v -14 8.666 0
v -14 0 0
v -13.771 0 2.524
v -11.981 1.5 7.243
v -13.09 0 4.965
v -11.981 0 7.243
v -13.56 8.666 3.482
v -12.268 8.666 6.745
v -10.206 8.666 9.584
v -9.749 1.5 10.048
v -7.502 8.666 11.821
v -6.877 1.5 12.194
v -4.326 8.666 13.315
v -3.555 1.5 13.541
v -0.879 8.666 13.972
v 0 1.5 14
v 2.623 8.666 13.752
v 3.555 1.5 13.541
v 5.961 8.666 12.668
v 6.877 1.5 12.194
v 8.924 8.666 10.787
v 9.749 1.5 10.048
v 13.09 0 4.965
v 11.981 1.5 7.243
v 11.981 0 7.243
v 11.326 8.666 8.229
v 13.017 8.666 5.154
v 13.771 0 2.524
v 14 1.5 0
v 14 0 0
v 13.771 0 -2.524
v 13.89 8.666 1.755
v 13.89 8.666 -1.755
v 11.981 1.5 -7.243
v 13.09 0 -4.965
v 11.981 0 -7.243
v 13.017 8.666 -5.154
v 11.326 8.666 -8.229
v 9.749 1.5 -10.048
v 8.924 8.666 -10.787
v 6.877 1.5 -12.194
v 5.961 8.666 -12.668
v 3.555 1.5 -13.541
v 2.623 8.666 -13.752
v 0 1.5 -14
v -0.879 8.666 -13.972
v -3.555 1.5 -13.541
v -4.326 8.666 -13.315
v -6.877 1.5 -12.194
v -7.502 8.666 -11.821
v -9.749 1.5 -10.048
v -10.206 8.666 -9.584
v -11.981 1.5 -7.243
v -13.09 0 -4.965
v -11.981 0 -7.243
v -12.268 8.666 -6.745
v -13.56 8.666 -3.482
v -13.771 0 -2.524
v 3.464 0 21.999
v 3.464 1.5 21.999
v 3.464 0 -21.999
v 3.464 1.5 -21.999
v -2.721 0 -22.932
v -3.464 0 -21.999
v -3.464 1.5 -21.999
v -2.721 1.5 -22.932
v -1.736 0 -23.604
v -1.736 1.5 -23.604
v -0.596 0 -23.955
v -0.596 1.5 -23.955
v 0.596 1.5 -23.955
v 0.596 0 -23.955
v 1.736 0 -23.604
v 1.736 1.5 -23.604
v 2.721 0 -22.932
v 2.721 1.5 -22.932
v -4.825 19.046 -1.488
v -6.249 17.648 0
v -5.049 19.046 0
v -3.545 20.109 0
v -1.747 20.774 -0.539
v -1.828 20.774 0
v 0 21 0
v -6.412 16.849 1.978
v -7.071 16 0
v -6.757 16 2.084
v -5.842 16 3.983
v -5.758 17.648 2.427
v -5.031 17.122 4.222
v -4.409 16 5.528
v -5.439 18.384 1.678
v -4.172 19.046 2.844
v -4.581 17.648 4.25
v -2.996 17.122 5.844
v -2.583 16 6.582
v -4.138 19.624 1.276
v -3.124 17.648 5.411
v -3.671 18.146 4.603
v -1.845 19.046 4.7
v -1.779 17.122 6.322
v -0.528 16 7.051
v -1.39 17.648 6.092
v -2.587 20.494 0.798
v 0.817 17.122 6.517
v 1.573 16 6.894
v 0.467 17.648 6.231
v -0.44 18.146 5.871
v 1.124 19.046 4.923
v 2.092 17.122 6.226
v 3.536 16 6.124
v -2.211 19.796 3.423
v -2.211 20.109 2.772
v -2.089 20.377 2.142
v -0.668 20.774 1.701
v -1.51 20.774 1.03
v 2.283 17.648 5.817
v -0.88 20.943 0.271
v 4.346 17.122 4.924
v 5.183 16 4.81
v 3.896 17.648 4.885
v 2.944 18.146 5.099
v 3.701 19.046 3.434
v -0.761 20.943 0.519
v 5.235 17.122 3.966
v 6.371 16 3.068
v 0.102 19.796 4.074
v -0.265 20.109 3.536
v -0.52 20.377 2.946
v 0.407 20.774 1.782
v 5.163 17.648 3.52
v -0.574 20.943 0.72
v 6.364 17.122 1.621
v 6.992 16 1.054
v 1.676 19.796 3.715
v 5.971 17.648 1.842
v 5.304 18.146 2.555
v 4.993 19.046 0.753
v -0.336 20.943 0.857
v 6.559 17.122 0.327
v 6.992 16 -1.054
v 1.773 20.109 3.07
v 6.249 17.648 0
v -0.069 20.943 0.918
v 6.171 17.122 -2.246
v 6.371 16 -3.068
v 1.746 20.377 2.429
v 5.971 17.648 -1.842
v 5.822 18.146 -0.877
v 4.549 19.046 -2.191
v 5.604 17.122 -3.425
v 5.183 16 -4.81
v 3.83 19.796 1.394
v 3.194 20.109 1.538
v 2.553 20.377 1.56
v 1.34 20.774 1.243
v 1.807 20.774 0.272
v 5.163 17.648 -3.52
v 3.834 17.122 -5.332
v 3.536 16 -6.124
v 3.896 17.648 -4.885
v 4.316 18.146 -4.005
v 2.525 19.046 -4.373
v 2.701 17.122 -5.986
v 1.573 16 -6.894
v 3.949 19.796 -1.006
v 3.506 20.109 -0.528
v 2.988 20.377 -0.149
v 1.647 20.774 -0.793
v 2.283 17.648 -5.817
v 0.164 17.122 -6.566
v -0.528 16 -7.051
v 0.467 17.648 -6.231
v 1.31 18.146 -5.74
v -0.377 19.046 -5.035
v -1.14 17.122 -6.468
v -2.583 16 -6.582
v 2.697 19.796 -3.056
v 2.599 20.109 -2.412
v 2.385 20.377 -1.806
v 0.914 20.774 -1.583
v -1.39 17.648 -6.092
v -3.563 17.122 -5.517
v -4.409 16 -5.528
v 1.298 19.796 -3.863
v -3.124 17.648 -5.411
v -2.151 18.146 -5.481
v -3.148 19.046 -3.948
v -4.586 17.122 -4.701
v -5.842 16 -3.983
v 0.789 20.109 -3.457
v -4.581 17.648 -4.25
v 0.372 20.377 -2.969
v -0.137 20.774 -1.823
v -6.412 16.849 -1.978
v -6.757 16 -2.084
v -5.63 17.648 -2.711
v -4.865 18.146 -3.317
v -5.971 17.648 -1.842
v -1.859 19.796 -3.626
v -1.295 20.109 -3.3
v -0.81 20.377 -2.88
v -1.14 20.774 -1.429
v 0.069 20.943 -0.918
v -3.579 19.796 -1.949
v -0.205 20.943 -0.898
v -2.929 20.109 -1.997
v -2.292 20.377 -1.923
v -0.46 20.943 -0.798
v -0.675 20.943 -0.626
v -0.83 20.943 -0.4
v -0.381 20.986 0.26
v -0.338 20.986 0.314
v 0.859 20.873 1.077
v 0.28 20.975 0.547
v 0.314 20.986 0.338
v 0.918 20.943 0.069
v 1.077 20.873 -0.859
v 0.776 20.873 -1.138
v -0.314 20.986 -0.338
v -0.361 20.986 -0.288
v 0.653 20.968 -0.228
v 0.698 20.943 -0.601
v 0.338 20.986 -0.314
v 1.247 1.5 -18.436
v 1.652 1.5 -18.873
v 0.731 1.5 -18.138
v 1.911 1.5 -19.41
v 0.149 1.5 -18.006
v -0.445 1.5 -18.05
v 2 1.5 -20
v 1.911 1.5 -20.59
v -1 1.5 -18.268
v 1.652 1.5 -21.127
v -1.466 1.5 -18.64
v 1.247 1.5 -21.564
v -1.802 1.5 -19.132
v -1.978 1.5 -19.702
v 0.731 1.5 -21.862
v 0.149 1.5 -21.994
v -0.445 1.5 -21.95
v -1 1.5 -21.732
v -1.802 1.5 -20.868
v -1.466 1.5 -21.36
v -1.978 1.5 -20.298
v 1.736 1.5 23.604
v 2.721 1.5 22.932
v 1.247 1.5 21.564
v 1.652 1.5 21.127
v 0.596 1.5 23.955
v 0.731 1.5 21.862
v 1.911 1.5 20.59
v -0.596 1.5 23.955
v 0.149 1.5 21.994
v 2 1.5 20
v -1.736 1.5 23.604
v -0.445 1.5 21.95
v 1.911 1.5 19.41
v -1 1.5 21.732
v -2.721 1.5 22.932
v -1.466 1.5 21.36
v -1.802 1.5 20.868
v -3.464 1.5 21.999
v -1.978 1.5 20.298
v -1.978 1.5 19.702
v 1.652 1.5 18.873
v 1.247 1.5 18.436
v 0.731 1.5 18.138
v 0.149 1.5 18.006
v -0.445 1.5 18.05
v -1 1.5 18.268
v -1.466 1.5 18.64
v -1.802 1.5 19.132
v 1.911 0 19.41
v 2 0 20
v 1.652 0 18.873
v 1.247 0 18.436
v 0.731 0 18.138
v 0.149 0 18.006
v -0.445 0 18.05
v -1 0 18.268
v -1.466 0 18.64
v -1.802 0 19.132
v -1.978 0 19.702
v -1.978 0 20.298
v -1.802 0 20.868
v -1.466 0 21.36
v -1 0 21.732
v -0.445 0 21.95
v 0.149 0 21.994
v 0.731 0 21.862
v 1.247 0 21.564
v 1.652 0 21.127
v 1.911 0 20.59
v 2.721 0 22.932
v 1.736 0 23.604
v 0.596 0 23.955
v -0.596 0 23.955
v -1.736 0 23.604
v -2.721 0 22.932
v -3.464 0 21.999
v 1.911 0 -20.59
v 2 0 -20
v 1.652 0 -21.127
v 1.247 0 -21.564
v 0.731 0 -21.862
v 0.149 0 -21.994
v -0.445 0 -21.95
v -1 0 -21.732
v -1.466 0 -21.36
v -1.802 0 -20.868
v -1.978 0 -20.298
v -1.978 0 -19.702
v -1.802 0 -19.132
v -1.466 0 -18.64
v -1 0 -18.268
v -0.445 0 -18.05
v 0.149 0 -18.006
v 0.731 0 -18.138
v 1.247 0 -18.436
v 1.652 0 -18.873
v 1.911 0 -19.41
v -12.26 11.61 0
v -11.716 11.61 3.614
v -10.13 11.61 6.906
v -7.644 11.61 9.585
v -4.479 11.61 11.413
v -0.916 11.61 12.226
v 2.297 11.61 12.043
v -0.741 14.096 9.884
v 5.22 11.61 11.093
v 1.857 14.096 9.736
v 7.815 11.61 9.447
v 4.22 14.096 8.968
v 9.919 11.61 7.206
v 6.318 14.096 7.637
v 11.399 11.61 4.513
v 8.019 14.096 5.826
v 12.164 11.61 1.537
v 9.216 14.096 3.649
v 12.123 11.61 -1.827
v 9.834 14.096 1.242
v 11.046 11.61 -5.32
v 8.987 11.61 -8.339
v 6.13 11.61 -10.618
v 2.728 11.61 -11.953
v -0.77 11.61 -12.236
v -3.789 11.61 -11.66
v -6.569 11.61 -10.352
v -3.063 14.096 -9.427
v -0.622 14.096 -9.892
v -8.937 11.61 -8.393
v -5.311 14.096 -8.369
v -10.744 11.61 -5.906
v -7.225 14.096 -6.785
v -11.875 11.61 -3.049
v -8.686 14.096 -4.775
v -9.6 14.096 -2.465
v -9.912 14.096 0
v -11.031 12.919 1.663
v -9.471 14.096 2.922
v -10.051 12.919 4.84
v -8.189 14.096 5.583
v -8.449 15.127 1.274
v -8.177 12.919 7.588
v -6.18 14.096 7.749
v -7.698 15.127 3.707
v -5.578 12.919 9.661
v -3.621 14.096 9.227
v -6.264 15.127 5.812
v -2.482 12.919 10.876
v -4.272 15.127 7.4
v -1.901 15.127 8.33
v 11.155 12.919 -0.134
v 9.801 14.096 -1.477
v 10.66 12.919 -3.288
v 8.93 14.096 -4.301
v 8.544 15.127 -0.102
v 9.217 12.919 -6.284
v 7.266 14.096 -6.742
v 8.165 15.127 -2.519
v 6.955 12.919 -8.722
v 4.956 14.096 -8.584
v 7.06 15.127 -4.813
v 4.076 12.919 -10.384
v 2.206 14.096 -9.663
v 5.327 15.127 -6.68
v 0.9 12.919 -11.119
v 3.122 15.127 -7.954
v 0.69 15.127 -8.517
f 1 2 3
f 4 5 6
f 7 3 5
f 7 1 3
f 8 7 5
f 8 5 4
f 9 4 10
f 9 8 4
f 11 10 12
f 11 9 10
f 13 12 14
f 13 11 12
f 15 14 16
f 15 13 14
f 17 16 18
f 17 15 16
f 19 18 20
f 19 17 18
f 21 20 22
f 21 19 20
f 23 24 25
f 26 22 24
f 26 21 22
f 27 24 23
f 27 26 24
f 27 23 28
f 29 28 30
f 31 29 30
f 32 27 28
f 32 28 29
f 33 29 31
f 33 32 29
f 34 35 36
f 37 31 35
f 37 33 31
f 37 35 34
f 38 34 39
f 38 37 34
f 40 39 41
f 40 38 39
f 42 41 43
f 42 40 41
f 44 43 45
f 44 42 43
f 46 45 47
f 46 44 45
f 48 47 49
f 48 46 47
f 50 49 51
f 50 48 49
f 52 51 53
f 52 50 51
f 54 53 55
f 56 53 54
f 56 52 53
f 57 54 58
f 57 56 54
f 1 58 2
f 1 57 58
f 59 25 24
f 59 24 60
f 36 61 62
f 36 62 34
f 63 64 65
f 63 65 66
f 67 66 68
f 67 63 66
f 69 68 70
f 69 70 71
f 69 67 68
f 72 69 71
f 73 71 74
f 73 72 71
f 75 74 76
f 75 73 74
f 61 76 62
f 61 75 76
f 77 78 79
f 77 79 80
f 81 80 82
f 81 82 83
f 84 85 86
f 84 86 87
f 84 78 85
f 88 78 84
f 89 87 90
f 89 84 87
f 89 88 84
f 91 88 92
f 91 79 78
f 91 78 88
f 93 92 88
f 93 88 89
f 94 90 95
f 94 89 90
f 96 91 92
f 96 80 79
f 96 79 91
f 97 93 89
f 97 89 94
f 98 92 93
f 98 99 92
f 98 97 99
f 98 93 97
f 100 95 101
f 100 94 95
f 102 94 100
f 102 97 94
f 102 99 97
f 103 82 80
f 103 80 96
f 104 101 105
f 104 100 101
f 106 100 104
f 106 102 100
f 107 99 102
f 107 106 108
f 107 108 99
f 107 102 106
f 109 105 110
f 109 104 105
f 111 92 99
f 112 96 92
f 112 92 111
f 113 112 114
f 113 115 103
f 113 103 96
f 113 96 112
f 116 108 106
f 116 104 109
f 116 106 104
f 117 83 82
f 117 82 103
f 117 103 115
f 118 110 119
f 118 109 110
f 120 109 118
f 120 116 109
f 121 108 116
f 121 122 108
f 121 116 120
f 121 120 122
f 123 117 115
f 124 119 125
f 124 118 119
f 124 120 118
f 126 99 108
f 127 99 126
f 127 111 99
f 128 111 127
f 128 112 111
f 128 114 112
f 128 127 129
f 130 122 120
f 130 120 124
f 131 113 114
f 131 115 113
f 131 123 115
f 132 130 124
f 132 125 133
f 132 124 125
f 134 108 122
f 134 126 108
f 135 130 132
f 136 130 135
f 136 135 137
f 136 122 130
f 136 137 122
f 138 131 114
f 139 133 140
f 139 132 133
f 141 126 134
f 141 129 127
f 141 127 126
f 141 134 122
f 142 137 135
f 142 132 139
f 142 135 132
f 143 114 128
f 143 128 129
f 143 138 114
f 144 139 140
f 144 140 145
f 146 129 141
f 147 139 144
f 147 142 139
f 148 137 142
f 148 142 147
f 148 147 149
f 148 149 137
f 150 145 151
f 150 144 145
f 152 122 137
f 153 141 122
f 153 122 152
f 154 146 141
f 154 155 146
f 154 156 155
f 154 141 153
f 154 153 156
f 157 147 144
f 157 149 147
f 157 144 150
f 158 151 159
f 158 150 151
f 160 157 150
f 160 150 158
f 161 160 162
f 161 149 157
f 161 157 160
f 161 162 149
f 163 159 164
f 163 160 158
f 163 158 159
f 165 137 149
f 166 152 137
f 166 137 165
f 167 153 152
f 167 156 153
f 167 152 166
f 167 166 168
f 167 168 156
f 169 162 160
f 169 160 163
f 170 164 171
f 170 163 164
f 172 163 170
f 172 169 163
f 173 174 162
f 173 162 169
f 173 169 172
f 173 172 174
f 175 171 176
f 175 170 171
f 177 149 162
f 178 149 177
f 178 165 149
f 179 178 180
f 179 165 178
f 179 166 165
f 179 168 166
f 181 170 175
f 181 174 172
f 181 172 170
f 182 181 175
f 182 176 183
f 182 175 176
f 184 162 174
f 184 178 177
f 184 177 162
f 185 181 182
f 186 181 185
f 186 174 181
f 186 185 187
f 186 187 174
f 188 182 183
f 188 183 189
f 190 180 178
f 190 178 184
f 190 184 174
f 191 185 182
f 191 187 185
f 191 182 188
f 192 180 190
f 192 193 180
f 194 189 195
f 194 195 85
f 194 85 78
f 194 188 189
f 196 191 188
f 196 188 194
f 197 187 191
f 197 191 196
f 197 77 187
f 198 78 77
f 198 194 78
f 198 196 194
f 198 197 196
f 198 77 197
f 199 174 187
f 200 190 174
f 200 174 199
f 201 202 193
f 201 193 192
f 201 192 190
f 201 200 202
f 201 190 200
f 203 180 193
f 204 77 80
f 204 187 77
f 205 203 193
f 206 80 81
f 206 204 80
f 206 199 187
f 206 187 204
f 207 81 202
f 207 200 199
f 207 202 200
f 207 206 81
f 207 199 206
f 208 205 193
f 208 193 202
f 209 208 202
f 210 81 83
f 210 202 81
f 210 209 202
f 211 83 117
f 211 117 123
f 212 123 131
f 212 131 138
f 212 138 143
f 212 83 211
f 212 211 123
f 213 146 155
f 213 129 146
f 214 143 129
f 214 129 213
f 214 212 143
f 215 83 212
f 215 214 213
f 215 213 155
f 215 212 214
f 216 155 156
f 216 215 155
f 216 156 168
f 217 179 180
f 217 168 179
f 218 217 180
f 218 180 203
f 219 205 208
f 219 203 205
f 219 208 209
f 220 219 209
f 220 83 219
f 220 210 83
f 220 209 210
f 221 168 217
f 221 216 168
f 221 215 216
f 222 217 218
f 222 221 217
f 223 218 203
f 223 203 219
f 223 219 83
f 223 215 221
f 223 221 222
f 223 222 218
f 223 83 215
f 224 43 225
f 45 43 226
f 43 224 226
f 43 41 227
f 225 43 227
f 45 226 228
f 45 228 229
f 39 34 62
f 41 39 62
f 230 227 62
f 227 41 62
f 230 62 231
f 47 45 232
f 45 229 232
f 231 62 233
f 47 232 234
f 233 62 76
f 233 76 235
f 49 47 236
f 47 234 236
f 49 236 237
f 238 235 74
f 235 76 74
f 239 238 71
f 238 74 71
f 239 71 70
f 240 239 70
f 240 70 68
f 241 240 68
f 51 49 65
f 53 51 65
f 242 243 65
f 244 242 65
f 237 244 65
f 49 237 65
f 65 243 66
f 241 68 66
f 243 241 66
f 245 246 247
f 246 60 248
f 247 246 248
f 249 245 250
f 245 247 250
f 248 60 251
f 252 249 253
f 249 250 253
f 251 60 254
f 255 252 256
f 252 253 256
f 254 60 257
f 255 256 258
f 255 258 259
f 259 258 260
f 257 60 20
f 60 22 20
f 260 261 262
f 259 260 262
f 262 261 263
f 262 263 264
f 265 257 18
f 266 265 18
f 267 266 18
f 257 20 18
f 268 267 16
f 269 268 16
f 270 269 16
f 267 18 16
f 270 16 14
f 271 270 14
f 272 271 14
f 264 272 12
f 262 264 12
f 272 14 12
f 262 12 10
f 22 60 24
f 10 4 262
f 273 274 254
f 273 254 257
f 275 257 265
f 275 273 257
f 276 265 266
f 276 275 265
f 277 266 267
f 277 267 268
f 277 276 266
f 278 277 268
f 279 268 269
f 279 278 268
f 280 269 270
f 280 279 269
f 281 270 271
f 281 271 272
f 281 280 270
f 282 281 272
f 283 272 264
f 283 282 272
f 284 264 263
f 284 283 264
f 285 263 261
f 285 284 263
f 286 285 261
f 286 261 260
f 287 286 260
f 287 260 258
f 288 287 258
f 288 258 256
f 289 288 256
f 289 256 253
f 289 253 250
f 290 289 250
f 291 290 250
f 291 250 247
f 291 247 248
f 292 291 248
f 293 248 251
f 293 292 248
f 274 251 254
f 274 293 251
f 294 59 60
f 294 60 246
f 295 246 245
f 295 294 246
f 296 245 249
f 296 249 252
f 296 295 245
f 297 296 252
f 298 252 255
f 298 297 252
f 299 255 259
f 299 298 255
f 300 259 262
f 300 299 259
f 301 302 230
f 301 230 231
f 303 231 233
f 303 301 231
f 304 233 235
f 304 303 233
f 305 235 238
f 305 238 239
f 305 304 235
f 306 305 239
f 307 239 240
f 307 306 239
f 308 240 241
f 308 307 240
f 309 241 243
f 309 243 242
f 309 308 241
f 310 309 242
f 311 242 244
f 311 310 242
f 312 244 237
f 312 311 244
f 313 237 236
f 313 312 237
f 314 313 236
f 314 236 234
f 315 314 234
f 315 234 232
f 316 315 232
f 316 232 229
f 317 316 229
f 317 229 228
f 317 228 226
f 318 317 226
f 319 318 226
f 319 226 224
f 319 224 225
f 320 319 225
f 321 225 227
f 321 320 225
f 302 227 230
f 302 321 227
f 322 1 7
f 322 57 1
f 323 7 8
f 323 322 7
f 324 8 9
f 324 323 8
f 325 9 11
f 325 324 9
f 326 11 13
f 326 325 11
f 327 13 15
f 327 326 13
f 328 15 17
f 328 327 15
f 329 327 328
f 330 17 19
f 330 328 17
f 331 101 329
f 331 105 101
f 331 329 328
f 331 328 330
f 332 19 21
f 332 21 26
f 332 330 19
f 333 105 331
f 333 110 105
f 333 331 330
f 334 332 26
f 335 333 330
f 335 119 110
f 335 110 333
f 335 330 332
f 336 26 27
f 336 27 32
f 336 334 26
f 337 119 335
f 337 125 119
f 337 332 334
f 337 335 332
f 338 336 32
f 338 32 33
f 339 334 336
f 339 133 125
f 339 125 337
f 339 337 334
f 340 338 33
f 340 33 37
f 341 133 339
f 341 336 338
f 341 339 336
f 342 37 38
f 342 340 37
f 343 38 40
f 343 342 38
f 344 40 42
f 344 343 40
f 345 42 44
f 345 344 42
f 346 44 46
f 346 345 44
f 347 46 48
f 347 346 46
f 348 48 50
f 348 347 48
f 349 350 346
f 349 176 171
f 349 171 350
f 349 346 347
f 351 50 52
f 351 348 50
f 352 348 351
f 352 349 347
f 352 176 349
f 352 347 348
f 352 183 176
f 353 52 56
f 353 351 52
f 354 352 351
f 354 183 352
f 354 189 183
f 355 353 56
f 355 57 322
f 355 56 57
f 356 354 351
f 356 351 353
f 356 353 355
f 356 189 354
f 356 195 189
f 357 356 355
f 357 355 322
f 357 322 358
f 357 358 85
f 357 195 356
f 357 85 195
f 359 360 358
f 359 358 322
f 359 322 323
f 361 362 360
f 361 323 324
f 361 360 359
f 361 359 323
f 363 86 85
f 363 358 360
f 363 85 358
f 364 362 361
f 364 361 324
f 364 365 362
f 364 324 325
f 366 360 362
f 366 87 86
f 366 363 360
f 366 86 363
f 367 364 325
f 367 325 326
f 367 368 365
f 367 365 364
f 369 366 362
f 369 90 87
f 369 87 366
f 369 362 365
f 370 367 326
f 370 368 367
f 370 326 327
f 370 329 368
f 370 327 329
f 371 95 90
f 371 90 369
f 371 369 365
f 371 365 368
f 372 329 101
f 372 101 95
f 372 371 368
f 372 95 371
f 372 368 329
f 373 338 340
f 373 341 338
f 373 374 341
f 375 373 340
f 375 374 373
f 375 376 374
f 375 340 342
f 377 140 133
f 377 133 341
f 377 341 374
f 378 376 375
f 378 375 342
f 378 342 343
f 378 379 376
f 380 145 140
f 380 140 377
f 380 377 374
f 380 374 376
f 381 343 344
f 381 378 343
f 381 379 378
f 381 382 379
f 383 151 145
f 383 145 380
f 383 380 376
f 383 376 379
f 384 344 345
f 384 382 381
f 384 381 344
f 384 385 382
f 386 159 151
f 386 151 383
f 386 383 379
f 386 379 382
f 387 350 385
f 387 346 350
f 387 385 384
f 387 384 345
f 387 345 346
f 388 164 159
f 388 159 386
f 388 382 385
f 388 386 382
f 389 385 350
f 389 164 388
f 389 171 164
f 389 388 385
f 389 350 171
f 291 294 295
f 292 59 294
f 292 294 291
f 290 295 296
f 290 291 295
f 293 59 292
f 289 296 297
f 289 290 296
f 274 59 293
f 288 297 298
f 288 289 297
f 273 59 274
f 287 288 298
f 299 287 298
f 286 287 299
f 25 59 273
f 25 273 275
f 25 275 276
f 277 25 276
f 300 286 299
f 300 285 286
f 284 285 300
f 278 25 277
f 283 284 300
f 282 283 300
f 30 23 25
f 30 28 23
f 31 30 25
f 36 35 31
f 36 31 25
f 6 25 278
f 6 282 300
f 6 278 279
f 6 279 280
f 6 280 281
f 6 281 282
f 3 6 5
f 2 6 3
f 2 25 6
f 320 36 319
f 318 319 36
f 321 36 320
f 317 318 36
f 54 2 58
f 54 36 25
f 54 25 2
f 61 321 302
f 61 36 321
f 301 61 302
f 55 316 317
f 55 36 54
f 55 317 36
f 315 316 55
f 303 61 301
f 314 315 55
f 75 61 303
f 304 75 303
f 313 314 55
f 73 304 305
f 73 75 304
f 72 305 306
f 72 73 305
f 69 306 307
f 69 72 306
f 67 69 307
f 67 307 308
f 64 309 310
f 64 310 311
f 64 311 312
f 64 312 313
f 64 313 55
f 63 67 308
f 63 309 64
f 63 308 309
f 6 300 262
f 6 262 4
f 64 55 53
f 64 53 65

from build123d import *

# Parameters (mm, degrees)
SKETCH_2_R      = 2
EXTRUDE_1_DEPTH = 1.5


with BuildPart() as part:
    # 草图1 → 旋转1 (revolve)
    with BuildSketch(Plane.XY):
        with BuildLine():
            Line((0, 0), (-14, 0))
            Line((-14, 0), (-14, 8.666286))
            ThreePointArc((-14, 8.666286), (-11.155416, 12.918811), (-7.071068, 16))
            ThreePointArc((-7.071068, 16), (-4.330127, 19.623724), (0, 21))
            Line((0, 21), (0, 0))
        make_face()
    revolve(axis=Axis((0, 0, 0), (0, 1, 0)))

    # 草图2 → 凸台-拉伸1 (add)
    with BuildSketch(Plane(origin=(0, 0, 0), x_dir=(1, 0, 0), z_dir=(0, 1, 0))):
        with BuildLine():
            Line((3.464435, 21.999422), (11.980808, 7.242943))
            ThreePointArc((11.980808, 7.242943), (14, 0), (11.980808, -7.242943))
            Line((11.980808, -7.242943), (3.464435, -21.999422))
            ThreePointArc((3.464435, -21.999422), (0, -24), (-3.464435, -21.999422))
            Line((-3.464435, -21.999422), (-11.980808, -7.242943))
            ThreePointArc((-11.980808, -7.242943), (-14, 0), (-11.980808, 7.242943))
            Line((-11.980808, 7.242943), (-3.464435, 21.999422))
            ThreePointArc((-3.464435, 21.999422), (0, 24), (3.464435, 21.999422))
        make_face()
        with Locations((0, 20)):
            Circle(SKETCH_2_R, mode=Mode.SUBTRACT)
        with Locations((0, -20)):
            Circle(SKETCH_2_R, mode=Mode.SUBTRACT)
    extrude(amount=EXTRUDE_1_DEPTH)


solid = part.part
